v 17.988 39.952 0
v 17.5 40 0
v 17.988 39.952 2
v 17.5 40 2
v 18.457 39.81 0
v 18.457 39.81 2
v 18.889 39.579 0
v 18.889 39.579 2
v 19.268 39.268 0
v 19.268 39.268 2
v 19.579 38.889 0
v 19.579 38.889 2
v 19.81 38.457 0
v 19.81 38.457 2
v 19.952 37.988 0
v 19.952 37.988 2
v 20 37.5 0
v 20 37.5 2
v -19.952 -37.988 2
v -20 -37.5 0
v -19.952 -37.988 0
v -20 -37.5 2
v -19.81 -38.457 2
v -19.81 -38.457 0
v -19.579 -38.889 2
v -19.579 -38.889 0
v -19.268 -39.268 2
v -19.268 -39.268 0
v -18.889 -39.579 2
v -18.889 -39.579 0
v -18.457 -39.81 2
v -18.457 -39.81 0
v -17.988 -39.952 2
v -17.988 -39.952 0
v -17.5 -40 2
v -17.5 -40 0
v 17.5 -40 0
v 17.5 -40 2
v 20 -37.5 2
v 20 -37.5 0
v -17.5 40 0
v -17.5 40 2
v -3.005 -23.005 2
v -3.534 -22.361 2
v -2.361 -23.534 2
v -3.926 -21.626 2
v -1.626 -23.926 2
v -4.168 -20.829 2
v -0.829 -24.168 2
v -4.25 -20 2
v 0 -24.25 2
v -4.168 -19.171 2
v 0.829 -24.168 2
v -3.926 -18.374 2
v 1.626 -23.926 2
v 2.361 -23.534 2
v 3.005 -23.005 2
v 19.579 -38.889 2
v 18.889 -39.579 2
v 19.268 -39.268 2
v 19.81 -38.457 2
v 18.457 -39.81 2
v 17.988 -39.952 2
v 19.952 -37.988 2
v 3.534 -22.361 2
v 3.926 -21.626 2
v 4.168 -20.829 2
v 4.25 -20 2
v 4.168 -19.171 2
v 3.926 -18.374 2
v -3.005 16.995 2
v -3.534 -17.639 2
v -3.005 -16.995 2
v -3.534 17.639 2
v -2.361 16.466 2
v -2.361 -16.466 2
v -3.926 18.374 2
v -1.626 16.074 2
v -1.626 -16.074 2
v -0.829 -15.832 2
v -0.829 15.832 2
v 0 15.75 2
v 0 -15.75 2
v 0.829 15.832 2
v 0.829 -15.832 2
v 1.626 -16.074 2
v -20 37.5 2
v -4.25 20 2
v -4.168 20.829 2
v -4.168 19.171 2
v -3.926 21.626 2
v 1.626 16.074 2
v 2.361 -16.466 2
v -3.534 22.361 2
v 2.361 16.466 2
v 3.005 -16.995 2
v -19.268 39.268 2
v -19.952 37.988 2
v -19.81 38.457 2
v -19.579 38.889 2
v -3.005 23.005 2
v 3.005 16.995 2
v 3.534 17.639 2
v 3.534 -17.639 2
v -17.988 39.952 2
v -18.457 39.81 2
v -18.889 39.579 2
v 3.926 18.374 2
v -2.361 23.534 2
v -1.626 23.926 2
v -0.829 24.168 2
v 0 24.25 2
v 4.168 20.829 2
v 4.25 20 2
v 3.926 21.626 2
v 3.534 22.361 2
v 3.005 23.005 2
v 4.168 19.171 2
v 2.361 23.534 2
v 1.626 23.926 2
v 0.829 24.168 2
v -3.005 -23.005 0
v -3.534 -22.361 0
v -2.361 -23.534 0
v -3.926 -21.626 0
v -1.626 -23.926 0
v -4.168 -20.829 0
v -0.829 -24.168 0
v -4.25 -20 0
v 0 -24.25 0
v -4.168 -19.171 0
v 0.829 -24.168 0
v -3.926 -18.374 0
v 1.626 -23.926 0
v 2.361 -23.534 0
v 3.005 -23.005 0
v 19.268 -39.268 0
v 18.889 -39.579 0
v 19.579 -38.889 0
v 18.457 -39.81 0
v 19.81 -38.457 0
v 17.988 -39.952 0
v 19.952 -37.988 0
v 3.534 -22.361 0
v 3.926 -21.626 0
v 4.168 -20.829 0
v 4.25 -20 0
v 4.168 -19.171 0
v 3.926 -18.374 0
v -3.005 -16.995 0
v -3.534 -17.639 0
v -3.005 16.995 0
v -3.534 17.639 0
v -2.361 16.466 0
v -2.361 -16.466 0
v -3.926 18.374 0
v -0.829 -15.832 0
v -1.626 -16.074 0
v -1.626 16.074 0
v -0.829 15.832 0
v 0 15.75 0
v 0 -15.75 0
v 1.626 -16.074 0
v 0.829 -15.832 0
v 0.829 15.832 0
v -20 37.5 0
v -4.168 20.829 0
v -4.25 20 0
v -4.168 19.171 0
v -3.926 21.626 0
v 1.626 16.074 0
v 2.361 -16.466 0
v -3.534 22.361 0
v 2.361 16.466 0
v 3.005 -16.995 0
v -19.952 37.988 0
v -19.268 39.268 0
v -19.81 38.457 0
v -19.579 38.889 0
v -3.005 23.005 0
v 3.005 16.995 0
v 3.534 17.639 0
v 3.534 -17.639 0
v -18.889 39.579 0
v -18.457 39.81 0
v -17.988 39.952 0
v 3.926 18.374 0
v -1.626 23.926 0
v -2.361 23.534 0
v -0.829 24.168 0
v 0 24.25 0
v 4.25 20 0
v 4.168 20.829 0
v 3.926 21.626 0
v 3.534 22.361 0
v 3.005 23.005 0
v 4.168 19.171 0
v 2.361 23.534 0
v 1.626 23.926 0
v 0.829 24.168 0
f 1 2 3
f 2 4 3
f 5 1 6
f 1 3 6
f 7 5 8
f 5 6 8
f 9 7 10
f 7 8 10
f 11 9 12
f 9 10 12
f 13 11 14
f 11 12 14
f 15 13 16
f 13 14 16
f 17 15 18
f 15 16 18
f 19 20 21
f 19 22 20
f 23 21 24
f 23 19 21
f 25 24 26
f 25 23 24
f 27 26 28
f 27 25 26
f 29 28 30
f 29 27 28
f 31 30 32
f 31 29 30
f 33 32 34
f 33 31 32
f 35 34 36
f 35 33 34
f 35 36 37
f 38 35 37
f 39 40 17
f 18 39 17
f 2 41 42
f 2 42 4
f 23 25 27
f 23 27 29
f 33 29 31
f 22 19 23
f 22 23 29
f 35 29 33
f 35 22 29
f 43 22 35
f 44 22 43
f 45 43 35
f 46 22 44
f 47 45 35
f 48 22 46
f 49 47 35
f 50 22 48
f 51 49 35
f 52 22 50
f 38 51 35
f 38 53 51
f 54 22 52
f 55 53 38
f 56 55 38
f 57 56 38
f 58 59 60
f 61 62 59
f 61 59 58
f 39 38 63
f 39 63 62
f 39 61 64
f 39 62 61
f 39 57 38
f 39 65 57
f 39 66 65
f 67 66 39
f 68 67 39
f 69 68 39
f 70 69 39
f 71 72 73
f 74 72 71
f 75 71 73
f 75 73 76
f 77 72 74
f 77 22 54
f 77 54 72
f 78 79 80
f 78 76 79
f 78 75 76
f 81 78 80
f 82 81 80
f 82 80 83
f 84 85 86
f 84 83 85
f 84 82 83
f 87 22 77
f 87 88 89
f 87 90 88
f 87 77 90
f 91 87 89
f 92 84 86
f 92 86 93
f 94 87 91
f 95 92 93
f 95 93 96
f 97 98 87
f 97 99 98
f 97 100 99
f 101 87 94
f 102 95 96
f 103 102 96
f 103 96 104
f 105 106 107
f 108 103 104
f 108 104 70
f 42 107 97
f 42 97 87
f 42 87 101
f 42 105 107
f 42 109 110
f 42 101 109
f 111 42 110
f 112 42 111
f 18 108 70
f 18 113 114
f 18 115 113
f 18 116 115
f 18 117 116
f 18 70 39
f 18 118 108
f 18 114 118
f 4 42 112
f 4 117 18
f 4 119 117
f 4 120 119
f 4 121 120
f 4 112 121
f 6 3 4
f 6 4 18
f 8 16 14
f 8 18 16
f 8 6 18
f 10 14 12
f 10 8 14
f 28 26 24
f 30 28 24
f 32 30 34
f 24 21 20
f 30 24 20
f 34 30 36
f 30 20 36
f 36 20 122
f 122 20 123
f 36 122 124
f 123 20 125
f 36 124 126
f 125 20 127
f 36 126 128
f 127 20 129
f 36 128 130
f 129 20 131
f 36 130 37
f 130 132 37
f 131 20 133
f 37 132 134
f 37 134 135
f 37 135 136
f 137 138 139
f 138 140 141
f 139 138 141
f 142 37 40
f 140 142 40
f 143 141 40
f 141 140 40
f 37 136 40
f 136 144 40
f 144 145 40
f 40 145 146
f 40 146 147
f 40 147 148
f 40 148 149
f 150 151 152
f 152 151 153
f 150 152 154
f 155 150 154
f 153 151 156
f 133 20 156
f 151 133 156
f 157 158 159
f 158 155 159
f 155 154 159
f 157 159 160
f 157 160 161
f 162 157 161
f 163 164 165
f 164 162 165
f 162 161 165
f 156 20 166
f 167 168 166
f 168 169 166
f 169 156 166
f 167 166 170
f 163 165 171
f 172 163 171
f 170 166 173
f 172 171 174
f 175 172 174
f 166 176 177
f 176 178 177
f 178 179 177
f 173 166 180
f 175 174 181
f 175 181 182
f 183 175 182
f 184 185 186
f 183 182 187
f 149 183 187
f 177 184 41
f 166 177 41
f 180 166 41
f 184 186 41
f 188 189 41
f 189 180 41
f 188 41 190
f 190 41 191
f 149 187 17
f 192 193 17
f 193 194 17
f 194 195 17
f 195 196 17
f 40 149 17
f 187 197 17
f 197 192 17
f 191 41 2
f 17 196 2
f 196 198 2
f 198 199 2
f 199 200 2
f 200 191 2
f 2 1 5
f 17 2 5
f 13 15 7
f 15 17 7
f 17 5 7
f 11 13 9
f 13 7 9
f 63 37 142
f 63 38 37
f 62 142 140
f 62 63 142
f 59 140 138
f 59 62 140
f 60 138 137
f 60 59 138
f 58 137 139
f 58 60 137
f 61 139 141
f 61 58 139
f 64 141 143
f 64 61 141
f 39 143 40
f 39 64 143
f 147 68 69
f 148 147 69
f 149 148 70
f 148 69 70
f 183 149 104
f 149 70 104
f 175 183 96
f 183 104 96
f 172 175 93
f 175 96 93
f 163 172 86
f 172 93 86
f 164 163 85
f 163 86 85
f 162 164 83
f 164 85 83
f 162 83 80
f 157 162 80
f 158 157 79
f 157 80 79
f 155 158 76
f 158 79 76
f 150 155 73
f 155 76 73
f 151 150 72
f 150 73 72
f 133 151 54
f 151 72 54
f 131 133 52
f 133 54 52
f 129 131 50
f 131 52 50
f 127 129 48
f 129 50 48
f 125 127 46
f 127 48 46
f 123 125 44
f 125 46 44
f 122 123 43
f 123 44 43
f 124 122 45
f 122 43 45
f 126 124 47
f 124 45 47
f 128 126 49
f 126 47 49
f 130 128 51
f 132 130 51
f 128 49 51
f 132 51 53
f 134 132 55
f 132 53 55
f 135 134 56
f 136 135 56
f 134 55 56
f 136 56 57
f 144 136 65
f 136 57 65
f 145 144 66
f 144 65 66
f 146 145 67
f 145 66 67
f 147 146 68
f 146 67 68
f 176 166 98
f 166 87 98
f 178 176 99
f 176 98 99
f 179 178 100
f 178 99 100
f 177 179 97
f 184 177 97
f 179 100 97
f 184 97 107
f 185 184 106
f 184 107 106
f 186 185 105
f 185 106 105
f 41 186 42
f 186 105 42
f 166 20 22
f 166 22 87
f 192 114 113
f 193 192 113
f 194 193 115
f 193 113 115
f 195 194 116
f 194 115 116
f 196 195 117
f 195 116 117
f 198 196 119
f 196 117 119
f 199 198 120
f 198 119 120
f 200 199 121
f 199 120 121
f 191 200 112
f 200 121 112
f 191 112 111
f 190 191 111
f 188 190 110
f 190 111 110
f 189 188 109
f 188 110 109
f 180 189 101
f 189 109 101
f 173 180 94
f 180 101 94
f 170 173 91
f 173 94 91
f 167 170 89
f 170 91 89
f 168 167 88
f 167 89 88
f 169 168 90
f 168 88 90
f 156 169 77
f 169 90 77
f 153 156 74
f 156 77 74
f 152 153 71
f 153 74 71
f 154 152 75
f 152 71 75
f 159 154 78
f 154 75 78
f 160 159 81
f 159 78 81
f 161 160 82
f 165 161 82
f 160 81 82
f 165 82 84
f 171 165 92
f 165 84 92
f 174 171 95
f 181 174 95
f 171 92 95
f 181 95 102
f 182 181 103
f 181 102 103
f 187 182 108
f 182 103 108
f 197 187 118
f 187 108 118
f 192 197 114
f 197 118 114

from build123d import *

# Parameters (mm, degrees)
SKETCH1_W           = 40
SKETCH1_H           = 80
BOSS_EXTRUDE1_DEPTH = 2
SKETCH2_R           = 4.25
CUT_EXTRUDE1_DEPTH  = 2
FILLET1_R           = 2.5


with BuildPart() as part:
    # Sketch1 → Boss-Extrude1 (new body)
    with BuildSketch(Plane.XY):
        Rectangle(SKETCH1_W, SKETCH1_H)
    extrude(amount=BOSS_EXTRUDE1_DEPTH)

    # Sketch2 → Cut-Extrude1 (cut)
    with BuildSketch(Plane.XY.offset(2)):
        with Locations((0, 20)):
            Circle(SKETCH2_R)
        with Locations((0, -20)):
            Circle(SKETCH2_R)
    extrude(amount=-CUT_EXTRUDE1_DEPTH, mode=Mode.SUBTRACT)

    # Fillet1
    fillet1_edges = [part.edges().sort_by_distance(p)[0] for p in [
        (-20, 40, 1),
        (20, 40, 1),
        (20, -40, 1),
        (-20, -40, 1),
    ]]
    fillet(fillet1_edges, radius=FILLET1_R)


solid = part.part
